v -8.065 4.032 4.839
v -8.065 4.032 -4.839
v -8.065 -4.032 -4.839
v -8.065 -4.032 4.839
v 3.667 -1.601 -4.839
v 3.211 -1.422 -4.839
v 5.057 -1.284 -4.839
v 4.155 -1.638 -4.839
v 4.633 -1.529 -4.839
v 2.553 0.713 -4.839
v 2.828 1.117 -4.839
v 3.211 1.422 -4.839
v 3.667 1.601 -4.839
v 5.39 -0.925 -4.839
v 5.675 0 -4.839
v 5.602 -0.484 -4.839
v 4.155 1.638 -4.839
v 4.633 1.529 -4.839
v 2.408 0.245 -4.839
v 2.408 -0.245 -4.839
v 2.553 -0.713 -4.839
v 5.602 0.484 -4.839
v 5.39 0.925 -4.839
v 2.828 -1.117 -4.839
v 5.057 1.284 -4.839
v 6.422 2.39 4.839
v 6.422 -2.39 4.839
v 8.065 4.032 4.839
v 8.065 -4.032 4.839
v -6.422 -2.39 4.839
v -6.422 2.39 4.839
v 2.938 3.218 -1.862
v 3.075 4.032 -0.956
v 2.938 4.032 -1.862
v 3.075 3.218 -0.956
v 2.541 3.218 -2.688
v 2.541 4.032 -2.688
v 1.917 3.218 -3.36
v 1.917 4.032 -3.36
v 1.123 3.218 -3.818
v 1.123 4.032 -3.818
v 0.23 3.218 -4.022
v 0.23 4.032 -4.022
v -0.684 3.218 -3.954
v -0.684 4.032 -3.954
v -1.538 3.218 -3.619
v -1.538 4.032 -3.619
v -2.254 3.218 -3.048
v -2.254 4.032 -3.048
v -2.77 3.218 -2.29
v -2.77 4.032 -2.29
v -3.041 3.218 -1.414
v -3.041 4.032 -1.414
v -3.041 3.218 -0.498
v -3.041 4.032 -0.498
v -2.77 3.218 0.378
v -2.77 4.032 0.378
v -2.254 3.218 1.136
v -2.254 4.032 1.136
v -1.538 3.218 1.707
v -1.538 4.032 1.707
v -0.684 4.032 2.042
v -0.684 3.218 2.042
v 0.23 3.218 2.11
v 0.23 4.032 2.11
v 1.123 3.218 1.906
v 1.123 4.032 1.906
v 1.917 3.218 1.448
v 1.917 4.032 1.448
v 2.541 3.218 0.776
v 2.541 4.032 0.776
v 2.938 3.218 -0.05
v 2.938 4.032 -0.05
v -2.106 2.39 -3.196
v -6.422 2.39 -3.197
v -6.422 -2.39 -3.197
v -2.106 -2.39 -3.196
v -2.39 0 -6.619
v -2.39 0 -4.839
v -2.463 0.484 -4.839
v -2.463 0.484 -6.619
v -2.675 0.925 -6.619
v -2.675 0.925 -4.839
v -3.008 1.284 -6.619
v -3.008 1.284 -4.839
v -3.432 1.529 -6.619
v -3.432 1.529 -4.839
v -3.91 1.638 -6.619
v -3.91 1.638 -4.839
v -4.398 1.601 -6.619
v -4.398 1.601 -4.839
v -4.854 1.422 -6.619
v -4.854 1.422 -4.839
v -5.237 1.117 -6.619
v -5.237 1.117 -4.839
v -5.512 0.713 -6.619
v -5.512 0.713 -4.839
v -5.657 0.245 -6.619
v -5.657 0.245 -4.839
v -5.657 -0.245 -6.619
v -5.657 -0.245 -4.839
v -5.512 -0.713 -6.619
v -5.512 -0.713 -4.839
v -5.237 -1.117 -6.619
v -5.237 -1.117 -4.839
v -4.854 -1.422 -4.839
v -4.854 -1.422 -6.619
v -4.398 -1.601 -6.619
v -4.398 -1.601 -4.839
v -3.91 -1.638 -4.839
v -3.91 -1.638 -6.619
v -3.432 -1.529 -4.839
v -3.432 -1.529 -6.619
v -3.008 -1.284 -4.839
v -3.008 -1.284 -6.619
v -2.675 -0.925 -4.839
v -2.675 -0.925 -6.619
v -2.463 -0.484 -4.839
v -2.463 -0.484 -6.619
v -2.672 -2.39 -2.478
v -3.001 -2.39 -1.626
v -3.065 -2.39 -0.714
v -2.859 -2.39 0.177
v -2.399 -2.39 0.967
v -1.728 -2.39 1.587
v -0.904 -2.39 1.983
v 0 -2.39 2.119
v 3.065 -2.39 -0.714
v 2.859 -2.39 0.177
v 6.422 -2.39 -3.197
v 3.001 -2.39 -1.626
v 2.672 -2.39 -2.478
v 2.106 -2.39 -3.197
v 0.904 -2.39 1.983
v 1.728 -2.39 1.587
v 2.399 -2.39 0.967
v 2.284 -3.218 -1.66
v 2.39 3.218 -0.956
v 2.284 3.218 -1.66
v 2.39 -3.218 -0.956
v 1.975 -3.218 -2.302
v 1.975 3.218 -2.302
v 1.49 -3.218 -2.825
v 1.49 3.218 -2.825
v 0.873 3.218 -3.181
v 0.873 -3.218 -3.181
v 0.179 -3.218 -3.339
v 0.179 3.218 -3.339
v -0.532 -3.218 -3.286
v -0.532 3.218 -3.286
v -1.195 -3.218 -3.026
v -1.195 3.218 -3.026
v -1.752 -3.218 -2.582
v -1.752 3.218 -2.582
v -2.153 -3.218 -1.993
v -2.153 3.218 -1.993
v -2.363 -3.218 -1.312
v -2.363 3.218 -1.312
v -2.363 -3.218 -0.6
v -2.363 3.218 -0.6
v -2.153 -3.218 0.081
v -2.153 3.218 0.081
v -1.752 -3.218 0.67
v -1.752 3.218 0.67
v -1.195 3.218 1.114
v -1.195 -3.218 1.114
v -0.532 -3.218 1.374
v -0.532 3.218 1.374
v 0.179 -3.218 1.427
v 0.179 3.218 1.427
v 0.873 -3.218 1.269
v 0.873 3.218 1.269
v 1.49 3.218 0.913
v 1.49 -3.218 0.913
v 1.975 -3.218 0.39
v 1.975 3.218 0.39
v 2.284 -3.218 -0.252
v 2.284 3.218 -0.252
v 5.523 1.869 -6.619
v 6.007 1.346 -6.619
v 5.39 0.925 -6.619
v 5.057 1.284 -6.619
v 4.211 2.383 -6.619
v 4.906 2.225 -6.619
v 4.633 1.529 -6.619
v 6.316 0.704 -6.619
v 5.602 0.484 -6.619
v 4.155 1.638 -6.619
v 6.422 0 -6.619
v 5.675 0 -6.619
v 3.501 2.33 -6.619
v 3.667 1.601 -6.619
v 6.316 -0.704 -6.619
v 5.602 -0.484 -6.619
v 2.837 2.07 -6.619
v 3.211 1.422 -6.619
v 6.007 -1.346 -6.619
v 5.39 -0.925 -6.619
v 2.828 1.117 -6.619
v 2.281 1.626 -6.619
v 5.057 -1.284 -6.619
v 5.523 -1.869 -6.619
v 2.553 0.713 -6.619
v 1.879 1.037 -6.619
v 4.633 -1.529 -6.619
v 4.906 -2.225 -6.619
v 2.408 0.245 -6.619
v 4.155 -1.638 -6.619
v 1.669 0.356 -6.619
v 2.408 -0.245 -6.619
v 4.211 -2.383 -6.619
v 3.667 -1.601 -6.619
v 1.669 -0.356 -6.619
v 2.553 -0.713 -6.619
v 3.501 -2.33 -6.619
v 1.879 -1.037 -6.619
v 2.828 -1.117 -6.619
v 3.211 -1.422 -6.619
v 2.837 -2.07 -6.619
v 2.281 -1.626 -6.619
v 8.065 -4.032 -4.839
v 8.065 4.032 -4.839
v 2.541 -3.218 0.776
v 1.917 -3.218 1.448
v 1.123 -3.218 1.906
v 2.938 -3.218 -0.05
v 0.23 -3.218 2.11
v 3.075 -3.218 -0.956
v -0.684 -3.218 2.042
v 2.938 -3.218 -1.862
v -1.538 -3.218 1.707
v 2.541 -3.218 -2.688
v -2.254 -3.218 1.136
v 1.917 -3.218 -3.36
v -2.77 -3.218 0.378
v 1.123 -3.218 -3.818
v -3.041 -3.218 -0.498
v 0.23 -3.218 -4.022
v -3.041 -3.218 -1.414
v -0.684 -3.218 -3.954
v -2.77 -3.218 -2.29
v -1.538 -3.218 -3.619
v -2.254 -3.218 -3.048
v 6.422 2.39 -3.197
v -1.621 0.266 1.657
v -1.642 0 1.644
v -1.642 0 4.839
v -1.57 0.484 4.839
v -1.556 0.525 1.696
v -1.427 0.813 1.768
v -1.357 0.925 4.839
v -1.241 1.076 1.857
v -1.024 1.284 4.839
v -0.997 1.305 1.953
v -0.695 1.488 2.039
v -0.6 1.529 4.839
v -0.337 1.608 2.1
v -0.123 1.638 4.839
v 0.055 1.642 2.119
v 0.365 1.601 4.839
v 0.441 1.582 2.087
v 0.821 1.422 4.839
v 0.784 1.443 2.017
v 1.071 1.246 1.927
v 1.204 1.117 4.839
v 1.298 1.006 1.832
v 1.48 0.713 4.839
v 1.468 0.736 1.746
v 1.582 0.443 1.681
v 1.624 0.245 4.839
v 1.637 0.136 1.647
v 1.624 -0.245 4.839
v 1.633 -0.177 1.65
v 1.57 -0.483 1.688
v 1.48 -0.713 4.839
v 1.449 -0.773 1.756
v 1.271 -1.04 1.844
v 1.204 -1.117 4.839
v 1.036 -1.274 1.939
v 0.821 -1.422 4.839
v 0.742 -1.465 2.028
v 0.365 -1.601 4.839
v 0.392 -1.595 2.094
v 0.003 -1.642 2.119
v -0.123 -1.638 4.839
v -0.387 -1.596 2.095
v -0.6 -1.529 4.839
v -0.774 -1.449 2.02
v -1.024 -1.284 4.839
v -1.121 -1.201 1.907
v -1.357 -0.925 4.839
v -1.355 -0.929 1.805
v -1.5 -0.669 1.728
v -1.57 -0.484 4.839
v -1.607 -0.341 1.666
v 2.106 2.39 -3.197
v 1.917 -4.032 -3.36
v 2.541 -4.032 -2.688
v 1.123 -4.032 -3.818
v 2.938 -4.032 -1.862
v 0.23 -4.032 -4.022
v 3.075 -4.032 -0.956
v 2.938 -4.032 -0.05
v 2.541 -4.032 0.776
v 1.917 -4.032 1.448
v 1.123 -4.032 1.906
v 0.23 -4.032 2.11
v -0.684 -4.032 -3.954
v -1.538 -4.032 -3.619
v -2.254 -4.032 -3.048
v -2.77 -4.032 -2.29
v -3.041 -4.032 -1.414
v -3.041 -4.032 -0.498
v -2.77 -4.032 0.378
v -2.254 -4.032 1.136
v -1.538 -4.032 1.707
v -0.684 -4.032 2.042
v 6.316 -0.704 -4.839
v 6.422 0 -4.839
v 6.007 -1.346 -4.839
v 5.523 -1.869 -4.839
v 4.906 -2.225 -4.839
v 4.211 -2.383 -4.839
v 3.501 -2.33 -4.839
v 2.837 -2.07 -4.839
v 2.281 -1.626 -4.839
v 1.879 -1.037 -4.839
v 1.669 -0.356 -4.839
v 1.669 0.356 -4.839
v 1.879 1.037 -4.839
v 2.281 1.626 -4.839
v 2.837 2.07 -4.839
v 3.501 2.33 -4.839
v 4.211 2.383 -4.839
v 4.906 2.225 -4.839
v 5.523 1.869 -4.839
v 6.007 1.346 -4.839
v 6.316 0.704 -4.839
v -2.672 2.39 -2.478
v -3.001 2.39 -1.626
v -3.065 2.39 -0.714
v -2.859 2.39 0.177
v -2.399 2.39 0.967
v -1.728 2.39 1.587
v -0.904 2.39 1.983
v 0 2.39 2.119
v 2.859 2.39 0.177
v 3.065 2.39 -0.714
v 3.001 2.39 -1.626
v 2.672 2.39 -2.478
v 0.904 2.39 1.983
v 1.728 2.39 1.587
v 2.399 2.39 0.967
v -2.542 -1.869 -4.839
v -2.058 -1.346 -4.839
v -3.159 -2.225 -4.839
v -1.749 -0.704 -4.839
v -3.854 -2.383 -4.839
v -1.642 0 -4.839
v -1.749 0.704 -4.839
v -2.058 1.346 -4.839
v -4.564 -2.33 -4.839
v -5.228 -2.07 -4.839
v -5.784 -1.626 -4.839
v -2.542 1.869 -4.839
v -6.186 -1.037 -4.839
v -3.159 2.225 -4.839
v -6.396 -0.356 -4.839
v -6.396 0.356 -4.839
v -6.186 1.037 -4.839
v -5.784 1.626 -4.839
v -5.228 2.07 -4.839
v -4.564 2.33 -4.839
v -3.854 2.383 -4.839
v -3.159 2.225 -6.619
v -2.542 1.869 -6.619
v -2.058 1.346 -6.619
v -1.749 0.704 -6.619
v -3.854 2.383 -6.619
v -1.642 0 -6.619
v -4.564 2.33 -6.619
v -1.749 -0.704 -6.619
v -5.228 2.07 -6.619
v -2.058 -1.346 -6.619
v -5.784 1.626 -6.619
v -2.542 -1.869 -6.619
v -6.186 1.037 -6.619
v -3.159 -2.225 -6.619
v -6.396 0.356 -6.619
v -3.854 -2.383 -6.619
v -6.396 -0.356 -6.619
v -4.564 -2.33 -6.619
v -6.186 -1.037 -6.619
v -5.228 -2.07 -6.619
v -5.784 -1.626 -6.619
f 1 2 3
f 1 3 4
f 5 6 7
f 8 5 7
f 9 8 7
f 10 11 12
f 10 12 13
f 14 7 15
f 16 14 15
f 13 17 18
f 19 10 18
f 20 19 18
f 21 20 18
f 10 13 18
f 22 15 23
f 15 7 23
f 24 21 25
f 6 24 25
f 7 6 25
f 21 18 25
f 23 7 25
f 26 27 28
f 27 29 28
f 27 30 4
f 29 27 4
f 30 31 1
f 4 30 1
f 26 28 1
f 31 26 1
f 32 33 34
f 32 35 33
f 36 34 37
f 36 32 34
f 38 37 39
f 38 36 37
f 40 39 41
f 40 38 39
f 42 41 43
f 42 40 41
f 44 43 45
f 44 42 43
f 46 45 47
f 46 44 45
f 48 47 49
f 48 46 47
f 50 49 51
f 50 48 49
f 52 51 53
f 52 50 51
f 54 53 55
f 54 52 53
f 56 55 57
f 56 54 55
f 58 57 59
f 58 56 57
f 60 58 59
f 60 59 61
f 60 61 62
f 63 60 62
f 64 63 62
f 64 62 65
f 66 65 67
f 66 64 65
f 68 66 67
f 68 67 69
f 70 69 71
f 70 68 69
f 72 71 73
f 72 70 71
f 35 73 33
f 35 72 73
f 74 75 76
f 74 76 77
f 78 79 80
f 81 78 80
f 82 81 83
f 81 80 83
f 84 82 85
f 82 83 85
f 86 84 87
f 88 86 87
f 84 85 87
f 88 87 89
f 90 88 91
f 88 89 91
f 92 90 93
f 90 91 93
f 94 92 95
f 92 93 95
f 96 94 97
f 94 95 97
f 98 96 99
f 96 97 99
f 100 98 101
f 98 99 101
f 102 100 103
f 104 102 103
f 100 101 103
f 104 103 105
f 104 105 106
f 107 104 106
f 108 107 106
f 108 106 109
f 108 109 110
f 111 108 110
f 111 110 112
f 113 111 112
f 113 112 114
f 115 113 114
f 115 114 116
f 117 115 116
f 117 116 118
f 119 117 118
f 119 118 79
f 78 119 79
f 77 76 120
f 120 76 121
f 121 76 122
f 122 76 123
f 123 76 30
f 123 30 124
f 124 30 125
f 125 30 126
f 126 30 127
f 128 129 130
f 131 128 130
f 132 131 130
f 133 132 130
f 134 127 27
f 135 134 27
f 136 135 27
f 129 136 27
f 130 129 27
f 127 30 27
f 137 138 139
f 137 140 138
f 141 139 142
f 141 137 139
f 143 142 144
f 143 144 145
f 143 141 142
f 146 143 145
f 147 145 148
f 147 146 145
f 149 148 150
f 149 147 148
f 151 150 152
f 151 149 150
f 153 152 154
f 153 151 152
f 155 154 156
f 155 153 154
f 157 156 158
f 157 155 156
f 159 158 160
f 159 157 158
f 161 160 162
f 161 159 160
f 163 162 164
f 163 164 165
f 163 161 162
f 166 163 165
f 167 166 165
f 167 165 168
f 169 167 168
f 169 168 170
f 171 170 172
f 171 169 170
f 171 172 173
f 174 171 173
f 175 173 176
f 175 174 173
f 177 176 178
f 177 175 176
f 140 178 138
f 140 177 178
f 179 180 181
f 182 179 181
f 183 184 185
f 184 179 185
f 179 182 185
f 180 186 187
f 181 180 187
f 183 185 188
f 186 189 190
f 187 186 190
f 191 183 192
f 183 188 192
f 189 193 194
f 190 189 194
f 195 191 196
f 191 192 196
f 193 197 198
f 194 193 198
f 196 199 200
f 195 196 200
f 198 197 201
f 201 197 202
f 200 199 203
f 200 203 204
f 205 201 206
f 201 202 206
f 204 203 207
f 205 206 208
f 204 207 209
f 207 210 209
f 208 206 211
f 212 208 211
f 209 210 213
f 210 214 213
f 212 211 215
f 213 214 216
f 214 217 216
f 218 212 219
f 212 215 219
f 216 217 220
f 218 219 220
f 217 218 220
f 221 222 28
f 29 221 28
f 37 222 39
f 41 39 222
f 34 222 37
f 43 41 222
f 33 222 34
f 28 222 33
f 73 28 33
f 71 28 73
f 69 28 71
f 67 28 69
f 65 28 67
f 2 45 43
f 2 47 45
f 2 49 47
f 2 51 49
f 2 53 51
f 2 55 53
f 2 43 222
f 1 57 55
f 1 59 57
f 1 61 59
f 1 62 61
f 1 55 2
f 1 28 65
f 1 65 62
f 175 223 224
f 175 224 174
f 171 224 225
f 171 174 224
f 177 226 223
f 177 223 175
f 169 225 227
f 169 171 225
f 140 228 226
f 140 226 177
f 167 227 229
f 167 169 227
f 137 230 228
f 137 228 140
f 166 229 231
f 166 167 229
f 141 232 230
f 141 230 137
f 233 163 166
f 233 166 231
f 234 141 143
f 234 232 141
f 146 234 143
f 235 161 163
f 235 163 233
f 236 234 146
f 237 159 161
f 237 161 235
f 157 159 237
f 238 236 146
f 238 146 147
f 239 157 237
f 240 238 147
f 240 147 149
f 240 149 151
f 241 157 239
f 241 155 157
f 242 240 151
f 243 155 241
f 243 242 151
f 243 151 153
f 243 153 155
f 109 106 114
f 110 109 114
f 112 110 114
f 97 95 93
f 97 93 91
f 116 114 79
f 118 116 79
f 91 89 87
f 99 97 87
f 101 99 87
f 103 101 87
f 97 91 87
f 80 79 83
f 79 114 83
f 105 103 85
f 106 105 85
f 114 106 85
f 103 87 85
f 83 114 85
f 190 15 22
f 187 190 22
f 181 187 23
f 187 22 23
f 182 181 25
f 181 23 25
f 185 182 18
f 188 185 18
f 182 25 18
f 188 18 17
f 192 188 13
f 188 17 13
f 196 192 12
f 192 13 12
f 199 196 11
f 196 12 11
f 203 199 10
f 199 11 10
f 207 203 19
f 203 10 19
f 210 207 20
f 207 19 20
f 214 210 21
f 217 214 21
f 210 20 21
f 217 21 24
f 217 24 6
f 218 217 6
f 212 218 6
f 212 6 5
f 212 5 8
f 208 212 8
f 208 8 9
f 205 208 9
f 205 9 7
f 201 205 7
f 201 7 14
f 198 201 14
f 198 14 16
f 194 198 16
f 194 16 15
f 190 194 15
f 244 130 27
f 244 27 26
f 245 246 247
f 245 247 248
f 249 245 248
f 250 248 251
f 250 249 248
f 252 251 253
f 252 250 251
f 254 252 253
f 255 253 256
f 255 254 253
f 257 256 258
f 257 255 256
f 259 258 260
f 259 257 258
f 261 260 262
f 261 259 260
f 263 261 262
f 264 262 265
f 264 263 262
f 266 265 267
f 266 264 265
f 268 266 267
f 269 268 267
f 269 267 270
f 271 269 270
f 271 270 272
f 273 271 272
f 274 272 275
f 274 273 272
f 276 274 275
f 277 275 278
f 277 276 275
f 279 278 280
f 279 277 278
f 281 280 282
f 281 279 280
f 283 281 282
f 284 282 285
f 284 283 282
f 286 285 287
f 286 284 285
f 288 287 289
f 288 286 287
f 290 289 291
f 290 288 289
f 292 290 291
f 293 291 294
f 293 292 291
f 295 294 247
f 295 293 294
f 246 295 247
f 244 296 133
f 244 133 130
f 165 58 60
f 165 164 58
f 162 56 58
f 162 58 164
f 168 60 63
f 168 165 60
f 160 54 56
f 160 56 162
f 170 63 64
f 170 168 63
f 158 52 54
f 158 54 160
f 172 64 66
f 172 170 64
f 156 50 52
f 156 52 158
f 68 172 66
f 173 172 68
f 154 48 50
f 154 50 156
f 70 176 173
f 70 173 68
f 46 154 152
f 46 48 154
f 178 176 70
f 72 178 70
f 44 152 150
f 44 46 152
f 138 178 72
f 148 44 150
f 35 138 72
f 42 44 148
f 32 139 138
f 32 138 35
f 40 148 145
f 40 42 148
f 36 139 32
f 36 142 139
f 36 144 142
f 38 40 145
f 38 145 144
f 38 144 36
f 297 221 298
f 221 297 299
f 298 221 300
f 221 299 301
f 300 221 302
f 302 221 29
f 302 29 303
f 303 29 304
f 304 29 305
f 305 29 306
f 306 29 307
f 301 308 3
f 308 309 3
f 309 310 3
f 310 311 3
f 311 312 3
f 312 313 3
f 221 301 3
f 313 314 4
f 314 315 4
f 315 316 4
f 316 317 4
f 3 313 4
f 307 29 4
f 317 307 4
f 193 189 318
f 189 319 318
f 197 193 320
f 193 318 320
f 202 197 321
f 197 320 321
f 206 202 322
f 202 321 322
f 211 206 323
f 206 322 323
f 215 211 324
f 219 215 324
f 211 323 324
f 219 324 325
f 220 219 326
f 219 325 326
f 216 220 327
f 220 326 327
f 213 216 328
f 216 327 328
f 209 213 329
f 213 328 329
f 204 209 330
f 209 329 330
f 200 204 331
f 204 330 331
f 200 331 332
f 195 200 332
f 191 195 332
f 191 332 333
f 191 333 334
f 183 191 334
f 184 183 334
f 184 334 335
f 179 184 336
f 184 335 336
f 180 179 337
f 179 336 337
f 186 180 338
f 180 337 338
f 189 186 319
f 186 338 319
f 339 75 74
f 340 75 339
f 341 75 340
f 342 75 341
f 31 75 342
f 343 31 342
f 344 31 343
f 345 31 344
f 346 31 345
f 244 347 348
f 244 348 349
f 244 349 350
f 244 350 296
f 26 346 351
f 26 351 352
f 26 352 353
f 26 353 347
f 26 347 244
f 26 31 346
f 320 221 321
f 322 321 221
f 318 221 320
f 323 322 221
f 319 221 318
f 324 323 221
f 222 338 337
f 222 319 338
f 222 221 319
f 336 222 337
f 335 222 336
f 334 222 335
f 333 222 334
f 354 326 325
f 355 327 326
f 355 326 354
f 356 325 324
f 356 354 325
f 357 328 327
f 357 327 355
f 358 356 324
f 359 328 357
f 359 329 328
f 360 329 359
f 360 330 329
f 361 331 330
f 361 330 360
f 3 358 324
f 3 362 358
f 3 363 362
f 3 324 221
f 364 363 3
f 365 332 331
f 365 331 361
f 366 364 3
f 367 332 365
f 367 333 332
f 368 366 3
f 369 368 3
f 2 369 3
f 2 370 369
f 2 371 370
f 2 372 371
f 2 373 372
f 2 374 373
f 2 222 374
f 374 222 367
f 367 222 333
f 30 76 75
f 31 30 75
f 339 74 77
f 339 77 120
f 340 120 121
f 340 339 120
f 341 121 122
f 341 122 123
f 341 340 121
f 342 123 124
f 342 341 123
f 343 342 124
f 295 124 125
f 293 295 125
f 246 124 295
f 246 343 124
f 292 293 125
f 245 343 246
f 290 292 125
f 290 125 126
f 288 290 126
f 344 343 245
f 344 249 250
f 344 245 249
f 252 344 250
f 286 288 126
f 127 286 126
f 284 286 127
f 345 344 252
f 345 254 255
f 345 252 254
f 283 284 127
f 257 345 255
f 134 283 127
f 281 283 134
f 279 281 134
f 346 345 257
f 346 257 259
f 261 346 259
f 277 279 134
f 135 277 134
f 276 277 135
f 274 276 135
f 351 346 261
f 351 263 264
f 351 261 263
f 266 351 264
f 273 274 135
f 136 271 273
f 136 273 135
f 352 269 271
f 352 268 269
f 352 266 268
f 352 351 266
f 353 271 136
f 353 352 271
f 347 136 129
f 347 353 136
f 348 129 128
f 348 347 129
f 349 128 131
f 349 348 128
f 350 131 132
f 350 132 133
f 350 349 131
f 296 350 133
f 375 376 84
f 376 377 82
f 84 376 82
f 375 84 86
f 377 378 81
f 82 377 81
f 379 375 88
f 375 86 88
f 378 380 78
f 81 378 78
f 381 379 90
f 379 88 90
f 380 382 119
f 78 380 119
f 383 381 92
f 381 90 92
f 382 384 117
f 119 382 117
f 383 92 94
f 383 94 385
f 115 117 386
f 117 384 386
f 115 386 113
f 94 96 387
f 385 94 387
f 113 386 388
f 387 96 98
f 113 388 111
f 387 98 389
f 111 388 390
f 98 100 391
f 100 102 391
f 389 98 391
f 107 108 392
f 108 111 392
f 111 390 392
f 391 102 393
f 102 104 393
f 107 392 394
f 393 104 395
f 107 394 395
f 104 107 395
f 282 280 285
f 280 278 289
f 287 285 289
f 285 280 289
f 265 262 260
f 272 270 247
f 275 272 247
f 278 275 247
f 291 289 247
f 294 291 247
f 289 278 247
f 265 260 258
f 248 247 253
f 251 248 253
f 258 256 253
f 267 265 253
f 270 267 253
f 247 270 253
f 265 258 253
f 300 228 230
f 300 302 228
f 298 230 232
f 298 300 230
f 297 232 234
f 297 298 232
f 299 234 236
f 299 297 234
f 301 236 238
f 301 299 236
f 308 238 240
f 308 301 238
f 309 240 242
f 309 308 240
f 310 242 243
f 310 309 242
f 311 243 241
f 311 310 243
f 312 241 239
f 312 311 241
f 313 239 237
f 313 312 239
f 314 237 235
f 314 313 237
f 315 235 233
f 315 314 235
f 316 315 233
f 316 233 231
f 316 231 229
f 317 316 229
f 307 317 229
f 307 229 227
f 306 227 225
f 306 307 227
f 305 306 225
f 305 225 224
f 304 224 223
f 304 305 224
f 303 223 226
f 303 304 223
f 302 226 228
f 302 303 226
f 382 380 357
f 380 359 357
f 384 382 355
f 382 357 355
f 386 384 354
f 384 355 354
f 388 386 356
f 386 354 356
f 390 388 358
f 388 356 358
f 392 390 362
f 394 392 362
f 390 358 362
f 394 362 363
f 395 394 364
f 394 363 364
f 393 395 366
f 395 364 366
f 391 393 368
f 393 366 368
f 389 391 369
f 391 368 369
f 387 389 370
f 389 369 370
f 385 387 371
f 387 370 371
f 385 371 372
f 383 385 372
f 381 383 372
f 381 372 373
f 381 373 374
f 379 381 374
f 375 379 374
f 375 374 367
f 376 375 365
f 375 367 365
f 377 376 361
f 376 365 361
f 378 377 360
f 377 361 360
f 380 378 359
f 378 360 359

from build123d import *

# Parameters (mm, degrees)
SKETCH1_W                = 16.13
SKETCH1_H                = 9.678
BOSS_EXTRUDE1_DEPTH      = 8.065
SKETCH2_W                = 12.845
SKETCH2_H                = 4.78
CUT_EXTRUDE1_DEPTH       = 8.0355
BOSS_EXTRUDE2_DEPTH      = 4.78
SKETCH4_W                = 2.39
SKETCH4_H                = 1.78
SKETCH5_W                = 2.39
SKETCH5_H                = 1.78
SKETCH7_W                = 1.6425
SKETCH7_H                = 3.195419505
M3_CLEARANCE_HOLE1_D     = 3.285
M3_CLEARANCE_HOLE1_DEPTH = 1.78


with BuildPart() as part:
    # Sketch1 → Boss-Extrude1 (new body)
    with BuildSketch(Plane(origin=(0, 4.0325, 0), x_dir=(-1, 0, 0), z_dir=(0, 1, 0))):
        Rectangle(SKETCH1_W, SKETCH1_H)
    extrude(amount=-BOSS_EXTRUDE1_DEPTH)

    # Sketch2 → Cut-Extrude1 (cut)
    with BuildSketch(Plane.XY.offset(4.839)):
        Rectangle(SKETCH2_W, SKETCH2_H)
    extrude(amount=-CUT_EXTRUDE1_DEPTH, mode=Mode.SUBTRACT)

    # Sketch3 → Boss-Extrude2 (add)
    with BuildSketch(Plane.XZ.offset(-2.39)):
        with BuildLine():
            Line((2.106130278, -3.1965), (-2.106130278, -3.1965))
            ThreePointArc((-2.106130278, -3.1965), (0, 2.119), (2.106130278, -3.1965))
        make_face()
    extrude(amount=BOSS_EXTRUDE2_DEPTH)

    # Sketch4 → Revolve1 (revolve)
    with BuildSketch(Plane.XZ):
        with Locations((5.2275, -5.729)):
            Rectangle(SKETCH4_W, SKETCH4_H)
    revolve(axis=Axis((4.0325, 0, -4.839), (0, 0, -1)))

    # Sketch5 → Revolve2 (revolve)
    with BuildSketch(Plane.XZ):
        with Locations((-2.8375, -5.729)):
            Rectangle(SKETCH5_W, SKETCH5_H)
    revolve(axis=Axis((-4.0325, 0, -4.839), (0, 0, -1)))

    # Sketch6 → Cut-Revolve1 (revolve, cut)
    with BuildSketch(Plane(origin=(0, 0, -0.956), x_dir=(-1, 0, 0), z_dir=(0, 0, -1))):
        Polygon((-3.075, -4.0325), (0, -4.0325), (0, 4.0325), (-3.075, 4.0325), (-3.075, 3.2175), (-2.39, 3.2175), (-2.39, -3.2175), (-3.075, -3.2175), align=None)
    revolve(axis=Axis((0, -4.0325, -0.956), (0, 1, 0)), mode=Mode.SUBTRACT)

    # Sketch7 → Revolve3 (revolve)
    with BuildSketch(Plane(origin=(0, 0, 0), x_dir=(1, 0, 0), z_dir=(0, 1, 0))):
        with Locations((-0.82125, -3.241290248)):
            Rectangle(SKETCH7_W, SKETCH7_H)
    revolve(axis=Axis((0, 0, 4.839), (0, 0, -1)))

    # M3 Clearance Hole1
    with Locations(Plane(origin=(0, 0, -6.619), x_dir=(-1, 0, 0), z_dir=(0, 0, -1))):
        with Locations((4.0325, 0), (-4.0325, 0)):
            Hole(M3_CLEARANCE_HOLE1_D / 2, depth=M3_CLEARANCE_HOLE1_DEPTH)


solid = part.part
